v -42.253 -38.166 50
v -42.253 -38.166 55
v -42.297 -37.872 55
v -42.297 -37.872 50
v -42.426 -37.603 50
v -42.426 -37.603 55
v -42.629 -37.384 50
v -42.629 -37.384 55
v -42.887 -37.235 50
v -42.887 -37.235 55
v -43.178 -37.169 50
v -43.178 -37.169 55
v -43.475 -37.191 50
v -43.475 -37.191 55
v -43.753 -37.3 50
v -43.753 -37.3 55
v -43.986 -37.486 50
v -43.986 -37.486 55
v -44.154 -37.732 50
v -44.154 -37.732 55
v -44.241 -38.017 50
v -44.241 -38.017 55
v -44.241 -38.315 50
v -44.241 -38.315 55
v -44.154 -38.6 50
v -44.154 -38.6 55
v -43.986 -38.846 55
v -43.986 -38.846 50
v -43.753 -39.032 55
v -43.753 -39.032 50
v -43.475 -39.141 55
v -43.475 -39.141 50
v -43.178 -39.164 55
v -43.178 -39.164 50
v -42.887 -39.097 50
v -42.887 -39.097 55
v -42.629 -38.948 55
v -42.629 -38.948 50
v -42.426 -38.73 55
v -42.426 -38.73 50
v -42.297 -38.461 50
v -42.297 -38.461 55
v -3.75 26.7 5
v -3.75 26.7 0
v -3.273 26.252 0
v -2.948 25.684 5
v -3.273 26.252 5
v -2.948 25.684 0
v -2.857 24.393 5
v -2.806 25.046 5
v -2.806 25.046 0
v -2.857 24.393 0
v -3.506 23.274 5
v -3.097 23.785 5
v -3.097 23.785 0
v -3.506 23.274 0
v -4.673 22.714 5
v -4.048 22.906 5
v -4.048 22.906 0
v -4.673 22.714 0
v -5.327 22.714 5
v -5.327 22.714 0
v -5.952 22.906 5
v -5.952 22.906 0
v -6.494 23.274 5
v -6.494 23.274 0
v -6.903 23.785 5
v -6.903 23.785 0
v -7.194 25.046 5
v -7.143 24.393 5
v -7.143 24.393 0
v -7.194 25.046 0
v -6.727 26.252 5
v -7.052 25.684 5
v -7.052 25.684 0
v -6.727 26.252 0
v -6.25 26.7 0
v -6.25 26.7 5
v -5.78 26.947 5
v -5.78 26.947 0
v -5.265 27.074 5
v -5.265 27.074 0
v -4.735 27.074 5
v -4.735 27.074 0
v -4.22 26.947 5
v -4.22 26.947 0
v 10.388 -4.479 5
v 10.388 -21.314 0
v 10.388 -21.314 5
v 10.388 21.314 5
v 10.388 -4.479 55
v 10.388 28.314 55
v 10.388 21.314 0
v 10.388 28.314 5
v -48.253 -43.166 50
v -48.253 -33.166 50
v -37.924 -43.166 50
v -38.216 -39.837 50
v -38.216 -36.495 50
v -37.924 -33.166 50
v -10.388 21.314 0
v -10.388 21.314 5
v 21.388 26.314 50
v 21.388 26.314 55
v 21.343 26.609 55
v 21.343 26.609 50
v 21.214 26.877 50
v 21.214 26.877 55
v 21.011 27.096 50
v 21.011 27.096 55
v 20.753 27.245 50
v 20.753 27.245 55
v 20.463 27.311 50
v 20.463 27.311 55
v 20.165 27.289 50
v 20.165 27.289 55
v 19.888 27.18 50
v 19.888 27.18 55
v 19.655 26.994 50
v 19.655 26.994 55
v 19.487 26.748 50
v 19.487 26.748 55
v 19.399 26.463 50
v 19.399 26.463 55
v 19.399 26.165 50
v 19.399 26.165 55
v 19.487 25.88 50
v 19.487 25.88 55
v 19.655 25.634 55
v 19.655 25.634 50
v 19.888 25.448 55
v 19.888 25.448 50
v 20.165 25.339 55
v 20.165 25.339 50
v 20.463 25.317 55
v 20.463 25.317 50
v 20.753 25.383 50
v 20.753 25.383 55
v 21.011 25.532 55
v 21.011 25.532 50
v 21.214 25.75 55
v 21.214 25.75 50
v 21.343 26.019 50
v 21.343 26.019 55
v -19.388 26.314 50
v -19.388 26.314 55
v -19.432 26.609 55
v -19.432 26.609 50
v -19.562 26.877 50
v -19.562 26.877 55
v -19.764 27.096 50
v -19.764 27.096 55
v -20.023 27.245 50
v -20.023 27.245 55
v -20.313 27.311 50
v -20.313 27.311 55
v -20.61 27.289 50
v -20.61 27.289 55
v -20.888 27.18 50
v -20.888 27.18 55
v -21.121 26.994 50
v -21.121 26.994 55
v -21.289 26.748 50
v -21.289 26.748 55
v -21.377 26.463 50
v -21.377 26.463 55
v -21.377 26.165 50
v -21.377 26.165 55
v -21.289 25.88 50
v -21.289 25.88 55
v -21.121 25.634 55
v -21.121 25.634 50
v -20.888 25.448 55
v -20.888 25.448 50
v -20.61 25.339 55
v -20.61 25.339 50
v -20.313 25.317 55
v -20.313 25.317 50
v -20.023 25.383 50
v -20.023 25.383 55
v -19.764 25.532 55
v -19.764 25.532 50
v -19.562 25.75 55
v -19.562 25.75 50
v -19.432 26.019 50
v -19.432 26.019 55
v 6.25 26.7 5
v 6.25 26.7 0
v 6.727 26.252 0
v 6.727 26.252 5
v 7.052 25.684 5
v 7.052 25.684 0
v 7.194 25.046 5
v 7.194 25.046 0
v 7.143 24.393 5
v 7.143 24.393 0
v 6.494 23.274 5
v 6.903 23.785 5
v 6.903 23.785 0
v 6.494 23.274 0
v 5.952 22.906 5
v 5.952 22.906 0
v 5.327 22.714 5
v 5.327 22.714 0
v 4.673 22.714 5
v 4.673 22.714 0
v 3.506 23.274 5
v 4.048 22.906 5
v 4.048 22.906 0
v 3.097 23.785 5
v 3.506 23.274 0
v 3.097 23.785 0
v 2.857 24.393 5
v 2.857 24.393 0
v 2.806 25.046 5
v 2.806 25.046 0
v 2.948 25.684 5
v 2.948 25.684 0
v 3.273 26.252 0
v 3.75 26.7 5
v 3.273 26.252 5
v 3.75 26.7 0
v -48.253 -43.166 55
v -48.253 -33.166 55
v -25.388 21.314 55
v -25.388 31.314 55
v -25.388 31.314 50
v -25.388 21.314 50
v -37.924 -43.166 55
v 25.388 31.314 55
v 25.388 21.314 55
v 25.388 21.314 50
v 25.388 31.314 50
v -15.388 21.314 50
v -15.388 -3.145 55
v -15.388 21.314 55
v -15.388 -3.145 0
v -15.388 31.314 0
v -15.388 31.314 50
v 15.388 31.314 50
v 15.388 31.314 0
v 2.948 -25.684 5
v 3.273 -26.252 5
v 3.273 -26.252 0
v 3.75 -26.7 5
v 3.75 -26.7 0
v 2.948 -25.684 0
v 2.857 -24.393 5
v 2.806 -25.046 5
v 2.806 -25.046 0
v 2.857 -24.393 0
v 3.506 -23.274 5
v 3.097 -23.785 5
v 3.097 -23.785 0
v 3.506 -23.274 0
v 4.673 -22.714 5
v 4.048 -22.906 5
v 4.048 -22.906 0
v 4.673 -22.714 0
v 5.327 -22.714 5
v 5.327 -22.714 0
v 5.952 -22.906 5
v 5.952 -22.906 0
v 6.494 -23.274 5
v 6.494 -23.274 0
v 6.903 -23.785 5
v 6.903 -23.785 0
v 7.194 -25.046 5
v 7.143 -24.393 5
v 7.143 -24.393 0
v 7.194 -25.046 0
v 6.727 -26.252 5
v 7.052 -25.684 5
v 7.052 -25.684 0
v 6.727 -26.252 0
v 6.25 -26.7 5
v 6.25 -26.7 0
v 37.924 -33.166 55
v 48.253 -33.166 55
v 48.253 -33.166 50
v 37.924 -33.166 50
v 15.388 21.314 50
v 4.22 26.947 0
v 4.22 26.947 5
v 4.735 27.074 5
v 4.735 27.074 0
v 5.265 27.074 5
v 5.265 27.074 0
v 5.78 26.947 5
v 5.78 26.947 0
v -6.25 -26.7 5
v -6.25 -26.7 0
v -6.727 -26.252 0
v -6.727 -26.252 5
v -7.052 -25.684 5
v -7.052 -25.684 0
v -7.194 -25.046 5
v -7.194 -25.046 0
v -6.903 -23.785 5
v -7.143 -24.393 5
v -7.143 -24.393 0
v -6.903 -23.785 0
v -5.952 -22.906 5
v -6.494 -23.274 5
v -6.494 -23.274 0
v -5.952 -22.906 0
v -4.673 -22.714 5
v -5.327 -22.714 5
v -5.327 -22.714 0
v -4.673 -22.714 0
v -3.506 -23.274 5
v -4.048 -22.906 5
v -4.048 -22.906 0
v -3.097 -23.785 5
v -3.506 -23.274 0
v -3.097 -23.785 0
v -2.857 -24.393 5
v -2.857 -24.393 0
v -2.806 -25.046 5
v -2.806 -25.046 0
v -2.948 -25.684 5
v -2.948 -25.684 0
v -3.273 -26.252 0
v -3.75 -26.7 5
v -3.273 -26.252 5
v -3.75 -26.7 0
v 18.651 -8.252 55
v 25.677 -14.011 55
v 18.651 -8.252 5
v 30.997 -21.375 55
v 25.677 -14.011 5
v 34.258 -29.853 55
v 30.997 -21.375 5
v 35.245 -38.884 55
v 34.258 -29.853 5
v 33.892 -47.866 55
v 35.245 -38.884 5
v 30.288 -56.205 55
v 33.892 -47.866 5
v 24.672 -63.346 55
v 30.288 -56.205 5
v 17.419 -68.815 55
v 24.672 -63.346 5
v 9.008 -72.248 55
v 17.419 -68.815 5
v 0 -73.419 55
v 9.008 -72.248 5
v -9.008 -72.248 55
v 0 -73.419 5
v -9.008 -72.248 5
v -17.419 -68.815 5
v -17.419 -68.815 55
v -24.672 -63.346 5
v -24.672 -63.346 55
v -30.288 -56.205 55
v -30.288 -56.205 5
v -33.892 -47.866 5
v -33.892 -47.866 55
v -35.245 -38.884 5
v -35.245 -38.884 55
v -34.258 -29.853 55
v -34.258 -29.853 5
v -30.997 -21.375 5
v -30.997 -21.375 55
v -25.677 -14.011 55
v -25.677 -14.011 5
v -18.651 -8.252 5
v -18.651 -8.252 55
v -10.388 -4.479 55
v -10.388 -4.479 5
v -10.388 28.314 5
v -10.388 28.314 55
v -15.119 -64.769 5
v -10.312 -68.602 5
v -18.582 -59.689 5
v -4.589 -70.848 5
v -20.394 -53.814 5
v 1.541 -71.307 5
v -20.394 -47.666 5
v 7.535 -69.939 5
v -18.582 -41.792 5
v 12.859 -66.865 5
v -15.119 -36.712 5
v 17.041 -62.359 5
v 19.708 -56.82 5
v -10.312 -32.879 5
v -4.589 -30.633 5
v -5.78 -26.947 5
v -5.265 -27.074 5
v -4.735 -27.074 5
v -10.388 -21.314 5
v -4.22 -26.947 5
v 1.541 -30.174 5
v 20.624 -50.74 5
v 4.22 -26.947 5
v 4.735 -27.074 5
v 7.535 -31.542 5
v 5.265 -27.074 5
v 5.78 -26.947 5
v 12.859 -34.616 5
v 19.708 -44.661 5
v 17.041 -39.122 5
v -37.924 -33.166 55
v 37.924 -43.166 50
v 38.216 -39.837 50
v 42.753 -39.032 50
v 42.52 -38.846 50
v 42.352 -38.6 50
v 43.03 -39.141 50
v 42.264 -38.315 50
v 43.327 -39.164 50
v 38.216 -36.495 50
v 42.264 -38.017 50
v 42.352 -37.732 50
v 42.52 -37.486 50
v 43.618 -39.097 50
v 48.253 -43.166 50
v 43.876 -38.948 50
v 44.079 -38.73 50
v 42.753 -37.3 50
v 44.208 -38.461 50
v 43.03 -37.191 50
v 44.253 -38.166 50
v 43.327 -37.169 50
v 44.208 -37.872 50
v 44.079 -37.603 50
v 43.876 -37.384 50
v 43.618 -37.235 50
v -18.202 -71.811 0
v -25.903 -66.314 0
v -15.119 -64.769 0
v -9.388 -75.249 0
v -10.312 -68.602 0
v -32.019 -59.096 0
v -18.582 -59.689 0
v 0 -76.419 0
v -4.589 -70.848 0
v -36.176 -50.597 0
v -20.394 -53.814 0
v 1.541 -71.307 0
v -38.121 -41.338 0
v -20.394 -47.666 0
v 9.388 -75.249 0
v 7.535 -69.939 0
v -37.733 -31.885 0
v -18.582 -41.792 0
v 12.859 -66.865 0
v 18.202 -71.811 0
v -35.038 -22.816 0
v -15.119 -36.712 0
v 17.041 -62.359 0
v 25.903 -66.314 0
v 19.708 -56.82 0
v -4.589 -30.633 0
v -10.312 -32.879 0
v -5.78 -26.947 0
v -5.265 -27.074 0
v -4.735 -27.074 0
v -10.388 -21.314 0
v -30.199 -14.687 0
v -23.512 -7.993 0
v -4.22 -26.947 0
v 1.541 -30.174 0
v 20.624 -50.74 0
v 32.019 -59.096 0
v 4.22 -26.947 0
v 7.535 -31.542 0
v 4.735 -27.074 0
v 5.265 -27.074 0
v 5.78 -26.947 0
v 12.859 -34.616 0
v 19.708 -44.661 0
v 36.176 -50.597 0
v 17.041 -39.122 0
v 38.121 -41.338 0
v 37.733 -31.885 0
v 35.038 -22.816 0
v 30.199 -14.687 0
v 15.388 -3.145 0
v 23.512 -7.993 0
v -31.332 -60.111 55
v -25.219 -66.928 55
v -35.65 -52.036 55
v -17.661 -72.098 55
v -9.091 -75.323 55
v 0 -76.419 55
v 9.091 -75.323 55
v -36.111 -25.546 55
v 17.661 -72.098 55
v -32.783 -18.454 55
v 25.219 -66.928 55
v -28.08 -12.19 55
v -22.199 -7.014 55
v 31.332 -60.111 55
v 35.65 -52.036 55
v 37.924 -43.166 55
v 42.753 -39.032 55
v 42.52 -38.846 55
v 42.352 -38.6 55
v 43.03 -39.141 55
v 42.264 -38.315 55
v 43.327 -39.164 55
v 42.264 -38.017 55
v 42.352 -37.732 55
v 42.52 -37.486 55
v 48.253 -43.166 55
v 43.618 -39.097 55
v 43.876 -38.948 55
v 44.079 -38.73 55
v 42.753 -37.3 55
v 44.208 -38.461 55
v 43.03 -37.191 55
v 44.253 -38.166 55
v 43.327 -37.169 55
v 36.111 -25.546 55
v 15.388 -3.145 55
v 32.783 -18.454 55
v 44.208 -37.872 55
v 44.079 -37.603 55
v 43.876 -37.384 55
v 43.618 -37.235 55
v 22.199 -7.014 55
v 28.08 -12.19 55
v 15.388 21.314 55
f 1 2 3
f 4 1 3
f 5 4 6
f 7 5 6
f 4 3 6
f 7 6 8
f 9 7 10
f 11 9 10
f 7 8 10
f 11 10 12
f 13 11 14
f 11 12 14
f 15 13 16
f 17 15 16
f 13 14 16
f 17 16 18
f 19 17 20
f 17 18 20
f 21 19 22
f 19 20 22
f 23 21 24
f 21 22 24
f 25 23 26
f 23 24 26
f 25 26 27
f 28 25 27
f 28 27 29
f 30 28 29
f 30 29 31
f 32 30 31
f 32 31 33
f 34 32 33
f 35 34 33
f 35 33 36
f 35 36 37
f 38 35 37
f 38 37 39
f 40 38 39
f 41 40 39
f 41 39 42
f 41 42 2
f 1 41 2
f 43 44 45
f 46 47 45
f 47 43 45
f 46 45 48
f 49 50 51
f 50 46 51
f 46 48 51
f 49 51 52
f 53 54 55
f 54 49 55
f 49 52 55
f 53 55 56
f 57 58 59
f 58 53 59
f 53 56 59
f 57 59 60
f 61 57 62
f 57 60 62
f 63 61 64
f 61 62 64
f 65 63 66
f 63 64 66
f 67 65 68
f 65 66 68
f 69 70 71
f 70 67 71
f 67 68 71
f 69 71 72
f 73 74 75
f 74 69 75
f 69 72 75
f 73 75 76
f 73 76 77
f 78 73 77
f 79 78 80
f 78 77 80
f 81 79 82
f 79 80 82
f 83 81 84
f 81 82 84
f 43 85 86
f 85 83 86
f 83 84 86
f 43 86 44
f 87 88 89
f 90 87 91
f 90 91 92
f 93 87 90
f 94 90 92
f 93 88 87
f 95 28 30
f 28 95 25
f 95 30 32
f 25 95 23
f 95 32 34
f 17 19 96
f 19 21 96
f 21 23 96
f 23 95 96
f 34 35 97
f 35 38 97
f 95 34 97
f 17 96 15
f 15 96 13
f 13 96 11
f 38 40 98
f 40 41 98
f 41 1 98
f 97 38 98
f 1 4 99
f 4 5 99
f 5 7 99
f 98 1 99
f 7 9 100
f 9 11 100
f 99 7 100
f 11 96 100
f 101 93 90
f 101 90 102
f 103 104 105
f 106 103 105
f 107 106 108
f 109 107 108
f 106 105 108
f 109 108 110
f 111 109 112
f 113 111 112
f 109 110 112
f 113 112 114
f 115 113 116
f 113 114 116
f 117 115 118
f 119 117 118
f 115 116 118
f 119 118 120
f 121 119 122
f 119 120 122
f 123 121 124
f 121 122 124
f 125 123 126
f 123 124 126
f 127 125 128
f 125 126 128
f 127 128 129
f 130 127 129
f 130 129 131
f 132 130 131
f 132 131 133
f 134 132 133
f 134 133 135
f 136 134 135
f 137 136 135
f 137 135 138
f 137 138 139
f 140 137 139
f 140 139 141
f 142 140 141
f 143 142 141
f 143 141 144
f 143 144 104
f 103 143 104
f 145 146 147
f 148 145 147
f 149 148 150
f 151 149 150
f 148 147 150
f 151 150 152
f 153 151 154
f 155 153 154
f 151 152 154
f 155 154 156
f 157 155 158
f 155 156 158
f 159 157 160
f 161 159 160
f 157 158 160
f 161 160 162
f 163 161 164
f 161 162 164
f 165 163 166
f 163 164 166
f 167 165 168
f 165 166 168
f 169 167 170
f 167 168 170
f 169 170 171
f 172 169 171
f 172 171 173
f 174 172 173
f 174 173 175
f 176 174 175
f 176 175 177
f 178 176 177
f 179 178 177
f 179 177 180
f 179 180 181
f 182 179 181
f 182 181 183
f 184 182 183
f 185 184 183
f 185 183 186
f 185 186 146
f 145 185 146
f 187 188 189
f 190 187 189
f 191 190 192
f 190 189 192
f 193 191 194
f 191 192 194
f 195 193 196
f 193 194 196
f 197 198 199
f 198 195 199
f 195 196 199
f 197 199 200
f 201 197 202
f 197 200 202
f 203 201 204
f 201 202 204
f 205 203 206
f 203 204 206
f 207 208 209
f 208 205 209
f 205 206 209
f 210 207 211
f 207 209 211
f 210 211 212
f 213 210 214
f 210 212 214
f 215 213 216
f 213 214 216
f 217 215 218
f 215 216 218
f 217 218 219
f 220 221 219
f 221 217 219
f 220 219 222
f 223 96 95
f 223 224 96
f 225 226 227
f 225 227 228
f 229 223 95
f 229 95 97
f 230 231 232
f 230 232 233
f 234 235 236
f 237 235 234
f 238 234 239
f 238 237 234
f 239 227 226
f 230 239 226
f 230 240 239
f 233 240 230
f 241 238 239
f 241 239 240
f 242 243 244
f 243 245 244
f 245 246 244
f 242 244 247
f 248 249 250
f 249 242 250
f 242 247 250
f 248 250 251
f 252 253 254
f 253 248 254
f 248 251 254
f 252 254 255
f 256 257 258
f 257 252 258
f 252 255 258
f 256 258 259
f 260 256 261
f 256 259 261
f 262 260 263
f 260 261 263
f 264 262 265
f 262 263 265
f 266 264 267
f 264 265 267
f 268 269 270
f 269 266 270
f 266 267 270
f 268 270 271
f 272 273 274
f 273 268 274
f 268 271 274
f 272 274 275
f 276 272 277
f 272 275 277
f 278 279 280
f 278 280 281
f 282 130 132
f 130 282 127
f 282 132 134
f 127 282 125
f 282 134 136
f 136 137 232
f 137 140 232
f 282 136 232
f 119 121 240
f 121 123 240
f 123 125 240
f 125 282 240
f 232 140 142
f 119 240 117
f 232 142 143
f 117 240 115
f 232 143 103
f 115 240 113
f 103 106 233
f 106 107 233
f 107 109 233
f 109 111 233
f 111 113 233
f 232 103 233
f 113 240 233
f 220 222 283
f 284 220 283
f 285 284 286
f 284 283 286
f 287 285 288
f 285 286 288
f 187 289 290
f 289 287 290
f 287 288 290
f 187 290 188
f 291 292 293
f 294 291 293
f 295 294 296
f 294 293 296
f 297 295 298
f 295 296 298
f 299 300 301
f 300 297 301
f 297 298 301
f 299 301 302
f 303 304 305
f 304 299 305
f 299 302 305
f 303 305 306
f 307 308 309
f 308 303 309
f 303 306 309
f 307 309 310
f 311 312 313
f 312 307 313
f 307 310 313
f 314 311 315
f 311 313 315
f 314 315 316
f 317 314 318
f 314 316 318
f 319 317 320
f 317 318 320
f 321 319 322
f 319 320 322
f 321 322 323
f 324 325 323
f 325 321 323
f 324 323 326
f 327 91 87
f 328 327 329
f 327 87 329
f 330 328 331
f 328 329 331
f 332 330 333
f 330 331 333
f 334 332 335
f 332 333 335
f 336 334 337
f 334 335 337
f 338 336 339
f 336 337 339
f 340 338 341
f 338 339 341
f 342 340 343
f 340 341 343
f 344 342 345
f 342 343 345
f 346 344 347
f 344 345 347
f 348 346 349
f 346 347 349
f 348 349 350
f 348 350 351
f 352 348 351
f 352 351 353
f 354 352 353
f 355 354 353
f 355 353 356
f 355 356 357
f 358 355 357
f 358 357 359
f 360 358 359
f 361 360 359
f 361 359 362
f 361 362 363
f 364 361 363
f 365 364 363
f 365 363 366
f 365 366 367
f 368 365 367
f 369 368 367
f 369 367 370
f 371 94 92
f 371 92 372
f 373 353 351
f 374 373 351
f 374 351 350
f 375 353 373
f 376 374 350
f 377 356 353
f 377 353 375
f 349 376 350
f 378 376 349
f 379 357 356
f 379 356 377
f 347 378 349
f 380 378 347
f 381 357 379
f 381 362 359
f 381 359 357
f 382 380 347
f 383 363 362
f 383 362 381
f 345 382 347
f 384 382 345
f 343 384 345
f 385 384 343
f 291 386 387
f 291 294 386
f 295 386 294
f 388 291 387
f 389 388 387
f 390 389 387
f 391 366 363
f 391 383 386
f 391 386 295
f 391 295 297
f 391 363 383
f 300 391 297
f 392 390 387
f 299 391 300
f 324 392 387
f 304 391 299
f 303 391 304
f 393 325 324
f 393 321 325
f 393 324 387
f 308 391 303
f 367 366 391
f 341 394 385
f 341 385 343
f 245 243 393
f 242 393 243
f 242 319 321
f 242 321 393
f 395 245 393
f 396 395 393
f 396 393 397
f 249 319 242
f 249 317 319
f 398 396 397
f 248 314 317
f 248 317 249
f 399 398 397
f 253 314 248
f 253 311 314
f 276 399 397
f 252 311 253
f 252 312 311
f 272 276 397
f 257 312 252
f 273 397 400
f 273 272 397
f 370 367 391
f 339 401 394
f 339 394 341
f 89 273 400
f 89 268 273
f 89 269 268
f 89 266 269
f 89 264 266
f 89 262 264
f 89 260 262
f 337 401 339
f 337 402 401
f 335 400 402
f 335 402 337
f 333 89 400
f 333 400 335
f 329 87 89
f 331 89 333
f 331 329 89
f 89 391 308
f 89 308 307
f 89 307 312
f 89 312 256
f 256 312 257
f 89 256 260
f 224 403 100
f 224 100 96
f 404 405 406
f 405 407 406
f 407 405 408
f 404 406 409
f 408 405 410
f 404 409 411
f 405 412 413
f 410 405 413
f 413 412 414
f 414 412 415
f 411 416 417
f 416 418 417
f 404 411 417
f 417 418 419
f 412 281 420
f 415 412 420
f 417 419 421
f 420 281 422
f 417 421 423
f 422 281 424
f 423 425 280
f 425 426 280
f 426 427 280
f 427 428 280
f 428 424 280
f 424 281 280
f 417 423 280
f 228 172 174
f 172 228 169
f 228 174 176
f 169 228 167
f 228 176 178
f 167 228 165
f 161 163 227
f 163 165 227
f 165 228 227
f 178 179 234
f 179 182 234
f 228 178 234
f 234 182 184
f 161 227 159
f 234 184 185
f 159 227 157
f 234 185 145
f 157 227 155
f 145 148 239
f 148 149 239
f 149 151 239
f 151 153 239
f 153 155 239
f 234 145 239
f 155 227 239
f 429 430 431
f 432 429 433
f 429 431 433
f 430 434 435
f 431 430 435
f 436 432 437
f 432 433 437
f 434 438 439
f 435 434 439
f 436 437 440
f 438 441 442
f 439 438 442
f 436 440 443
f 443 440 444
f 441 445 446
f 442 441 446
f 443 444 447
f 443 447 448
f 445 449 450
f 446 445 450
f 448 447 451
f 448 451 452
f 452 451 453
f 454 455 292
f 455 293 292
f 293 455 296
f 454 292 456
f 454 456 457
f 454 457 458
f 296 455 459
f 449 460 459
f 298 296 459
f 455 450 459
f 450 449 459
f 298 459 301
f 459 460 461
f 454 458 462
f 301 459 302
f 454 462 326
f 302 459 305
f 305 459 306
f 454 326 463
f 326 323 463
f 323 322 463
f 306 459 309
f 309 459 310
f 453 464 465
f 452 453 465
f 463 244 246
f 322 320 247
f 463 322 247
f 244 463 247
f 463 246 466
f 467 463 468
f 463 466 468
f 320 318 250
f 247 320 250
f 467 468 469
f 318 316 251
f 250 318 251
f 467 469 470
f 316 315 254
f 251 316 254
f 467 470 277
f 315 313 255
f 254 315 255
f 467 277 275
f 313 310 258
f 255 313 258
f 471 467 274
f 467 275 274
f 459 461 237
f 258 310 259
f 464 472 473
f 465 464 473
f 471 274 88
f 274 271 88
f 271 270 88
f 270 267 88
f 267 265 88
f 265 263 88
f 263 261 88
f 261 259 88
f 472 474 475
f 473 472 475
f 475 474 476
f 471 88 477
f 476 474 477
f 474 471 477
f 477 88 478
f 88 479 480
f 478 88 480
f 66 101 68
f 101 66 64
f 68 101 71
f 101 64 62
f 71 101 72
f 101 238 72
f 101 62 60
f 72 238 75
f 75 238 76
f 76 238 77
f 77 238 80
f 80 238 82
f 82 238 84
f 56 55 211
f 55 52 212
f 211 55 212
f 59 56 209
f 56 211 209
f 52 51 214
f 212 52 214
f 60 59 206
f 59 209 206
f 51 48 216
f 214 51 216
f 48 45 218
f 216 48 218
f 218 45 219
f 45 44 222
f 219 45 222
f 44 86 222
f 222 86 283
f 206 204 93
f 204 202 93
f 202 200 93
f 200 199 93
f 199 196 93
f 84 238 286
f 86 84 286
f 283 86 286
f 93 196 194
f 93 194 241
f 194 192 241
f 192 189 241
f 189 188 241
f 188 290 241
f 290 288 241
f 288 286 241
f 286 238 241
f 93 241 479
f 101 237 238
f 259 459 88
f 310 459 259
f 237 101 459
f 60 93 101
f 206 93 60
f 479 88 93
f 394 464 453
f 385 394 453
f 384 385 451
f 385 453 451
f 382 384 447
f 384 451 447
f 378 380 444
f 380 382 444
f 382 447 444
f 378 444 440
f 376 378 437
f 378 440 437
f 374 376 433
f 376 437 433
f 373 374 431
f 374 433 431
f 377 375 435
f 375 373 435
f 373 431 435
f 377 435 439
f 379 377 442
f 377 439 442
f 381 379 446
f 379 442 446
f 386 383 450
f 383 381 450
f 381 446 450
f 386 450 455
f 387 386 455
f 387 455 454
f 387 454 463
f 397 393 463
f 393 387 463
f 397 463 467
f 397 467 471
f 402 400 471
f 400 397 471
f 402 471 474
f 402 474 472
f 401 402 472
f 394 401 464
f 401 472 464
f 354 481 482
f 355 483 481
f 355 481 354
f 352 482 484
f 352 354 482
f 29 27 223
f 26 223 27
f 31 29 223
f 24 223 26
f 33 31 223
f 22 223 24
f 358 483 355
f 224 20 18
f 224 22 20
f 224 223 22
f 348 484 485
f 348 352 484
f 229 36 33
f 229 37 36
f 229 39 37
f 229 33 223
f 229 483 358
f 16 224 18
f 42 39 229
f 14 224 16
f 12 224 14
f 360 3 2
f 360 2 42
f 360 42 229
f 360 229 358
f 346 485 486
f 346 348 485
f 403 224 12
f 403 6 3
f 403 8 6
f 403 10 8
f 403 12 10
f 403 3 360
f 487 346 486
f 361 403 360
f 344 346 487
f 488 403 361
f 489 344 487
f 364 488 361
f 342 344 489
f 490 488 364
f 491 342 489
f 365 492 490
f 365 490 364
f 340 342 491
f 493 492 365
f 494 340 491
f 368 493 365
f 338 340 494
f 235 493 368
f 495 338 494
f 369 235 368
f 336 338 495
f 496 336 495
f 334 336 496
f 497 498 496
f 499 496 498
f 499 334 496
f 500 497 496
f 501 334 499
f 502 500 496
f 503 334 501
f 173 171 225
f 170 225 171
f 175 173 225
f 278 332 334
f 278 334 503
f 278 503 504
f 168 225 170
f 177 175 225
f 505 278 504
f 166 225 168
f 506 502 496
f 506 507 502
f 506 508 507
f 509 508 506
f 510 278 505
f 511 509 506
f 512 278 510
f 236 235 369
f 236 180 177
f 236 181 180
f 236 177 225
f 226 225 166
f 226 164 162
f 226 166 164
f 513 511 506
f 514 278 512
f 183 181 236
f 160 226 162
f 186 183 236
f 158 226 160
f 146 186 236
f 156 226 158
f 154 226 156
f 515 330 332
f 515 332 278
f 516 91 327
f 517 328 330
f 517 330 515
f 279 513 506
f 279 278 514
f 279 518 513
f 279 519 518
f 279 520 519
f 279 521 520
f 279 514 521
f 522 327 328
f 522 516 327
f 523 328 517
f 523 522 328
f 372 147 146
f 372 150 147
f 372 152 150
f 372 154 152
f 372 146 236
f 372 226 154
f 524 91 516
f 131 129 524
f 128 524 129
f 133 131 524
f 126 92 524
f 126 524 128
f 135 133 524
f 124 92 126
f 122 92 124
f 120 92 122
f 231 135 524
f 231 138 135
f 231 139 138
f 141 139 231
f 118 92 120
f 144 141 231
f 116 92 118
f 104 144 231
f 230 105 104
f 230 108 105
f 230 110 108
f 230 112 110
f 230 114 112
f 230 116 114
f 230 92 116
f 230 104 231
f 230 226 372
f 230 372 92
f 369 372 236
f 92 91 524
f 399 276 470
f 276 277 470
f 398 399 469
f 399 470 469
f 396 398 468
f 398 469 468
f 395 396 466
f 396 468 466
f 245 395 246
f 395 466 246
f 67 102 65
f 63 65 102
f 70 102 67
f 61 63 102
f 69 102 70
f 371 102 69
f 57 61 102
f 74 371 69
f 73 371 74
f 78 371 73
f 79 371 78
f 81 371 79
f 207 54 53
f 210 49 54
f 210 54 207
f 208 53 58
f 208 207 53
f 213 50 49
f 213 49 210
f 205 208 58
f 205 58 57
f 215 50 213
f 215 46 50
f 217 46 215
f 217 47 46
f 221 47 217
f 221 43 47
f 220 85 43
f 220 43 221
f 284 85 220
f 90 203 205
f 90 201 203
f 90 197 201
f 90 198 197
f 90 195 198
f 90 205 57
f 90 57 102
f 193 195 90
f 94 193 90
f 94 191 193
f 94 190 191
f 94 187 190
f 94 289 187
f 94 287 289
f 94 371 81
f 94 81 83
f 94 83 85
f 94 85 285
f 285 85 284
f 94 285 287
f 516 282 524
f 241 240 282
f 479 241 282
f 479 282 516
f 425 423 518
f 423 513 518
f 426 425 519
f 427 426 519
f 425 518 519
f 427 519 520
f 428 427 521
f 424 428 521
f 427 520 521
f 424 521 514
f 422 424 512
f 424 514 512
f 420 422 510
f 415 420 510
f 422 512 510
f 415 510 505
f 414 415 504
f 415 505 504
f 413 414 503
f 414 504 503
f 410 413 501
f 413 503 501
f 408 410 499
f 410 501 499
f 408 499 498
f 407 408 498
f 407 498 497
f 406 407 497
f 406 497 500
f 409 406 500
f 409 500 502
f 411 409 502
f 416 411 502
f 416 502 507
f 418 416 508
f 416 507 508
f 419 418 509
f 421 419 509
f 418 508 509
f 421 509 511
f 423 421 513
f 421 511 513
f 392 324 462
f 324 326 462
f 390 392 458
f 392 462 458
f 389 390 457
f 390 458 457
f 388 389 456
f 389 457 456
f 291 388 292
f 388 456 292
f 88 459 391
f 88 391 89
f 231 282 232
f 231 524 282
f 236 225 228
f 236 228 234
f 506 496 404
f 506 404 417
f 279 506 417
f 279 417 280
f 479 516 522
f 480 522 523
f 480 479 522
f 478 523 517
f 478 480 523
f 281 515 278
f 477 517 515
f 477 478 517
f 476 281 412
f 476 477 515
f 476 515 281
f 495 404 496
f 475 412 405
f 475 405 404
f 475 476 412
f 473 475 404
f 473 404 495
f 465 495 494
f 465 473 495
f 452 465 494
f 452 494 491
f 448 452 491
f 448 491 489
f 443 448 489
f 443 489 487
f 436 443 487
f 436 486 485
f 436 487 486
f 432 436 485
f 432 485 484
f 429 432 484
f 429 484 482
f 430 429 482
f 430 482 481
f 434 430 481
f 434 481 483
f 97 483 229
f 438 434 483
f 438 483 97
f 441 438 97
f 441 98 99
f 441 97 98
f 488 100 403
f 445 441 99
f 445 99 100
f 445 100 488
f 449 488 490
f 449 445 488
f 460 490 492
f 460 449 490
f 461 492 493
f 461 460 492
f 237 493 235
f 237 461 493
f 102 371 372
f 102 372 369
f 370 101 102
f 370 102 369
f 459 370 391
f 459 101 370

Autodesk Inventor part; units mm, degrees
ref_plane "YZ Plane" through (0, 0, 0) normal (1, 0, 0) x (0, 1, 0)
ref_plane "XZ Plane" through (0, 0, 0) normal (0, 1, 0) x (-1, 0, 0)
ref_plane "XY Plane" through (0, 0, 0) normal (0, 0, 1) x (1, 0, 0)
ref_plane "Work Plane1" through (0, 0, 0) normal (0, 0, 1) x (1, 0, 0)
sketch "Sketch1" plane through (0, 0, 0) normal (0, 0, 1) x (1, 0, 0)
  line L0 (10.3879, -20.2759) -> (10.3879, 20.2759)
  line L1 (-9.35, -21.3138) -> (9.35, -21.3138)
  line L2 (-10.3879, -21.3138) -> (10.3879, -21.3138)
  line L3 (10.3879, -21.3138) -> (10.3879, 21.3138)
  line L4 (10.3879, 21.3138) -> (-10.3879, 21.3138)
  line L5 (-10.3879, 21.3138) -> (-10.3879, -21.3138)
  line L6 (-10.3879, -21.3138) -> (10.3879, 21.3138) construction
  line L7 (10.3879, -21.3138) -> (-10.3879, 21.3138) construction
  line L8 (-15.3879, 31.3138) -> (15.3879, 31.3138)
  arc A0 (-6.25, 26.7) -> (-3.75, 26.7) centre (-5, 24.8896) ccw projected
  arc A1 (3.75, 26.7) -> (6.25, 26.7) centre (5, 24.8896) ccw projected
  arc A2 (-3.75, -26.7) -> (-6.25, -26.7) centre (-5, -24.8896) ccw projected
  arc A3 (6.25, -26.7) -> (3.75, -26.7) centre (5, -24.8896) ccw projected
  circle A4 centre (-5, 24.8896) radius 2.2
  circle A5 centre (5, 24.8896) radius 2.2
  circle A6 centre (-5, -24.8896) radius 2.2
  circle A7 centre (5, -24.8896) radius 2.2
  circle A8 centre (0, -50.7404) radius 20.6245
  arc A9 (-15.3879, -3.1452) -> (15.3879, -3.1452) centre (0, -38.1663) ccw
  arc A10 (0.0421, 0.0864) -> (-0.0421, 0.0864) centre (0, -38.1663) ccw
  line L9 (15.3879, 31.3138) -> (15.3879, -3.1452)
  line L10 (-15.3879, -3.1452) -> (-15.3879, 31.3138)
  point P0 (0, 0)
  dimension "d0" = 10.3879
  dimension "d5" = 10
extrude "Extrusion1" add sketch "Sketch1" along normal blind 5
sketch "Sketch2" plane through (0, 0, 5) normal (0, 0, 1) x (1, 0, 0)
  arc A0 (-15.3879, -3.1452) -> (15.3879, -3.1452) centre (0, -38.1663) ccw projected
  arc A1 (-15.3879, -3.1452) -> (15.3879, -3.1452) centre (0, -38.1663) ccw
  circle A2 centre (-5, -24.8896) radius 2.2 projected
  circle A3 centre (5, -24.8896) radius 2.2 projected
  circle A4 centre (0, -50.7404) radius 20.6245 projected
  line L0 (-10.3879, -21.3138) -> (-10.3879, 21.3138) projected
  line L1 (10.3879, 21.3138) -> (10.3879, -21.3138) projected
  line L2 (10.3879, -21.3138) -> (-10.3879, -21.3138) projected
  line L3 (10.3879, -4.4789) -> (10.3879, -1.3511)
  line L4 (-10.3879, -1.3511) -> (-10.3879, -4.4789)
  line L5 (-15.3879, 31.3138) -> (15.3879, 31.3138)
  line L6 (15.3879, 31.3138) -> (15.3879, -3.1452)
  line L7 (-15.3879, -3.1452) -> (-15.3879, 31.3138)
  line L8 (10.3879, -4.4789) -> (10.3879, 21.3138)
  line L9 (-10.3879, 21.3138) -> (-10.3879, -4.4789)
  circle A5 centre (-5, 24.8896) radius 2.2 projected
  circle A6 centre (5, 24.8896) radius 2.2 projected
  circle A7 centre (0, -38.1663) radius 35.2526
  line L10 (10.3879, -4.4789) -> (10.3879, 28.3138)
  line L11 (10.3879, 28.3138) -> (-10.3879, 28.3138)
  line L12 (-10.3879, 28.3138) -> (-10.3879, -4.4789)
  point P0 (0, 0)
  dimension "d8" = 3
  dimension "d9" = 3
extrude "Extrusion2" add sketch "Sketch2" along normal blind 50 contours L7 L5 L6 A0
sketch "Sketch3" plane through (0, 0, 55) normal (0, 0, 1) x (1, 0, 0)
  line L0 (-15.3879, 31.3138) -> (-25.3879, 31.3138)
  line L1 (-25.3879, 31.3138) -> (-25.3879, 21.3138)
  line L2 (-25.3879, 21.3138) -> (-15.3879, 21.3138)
  line L3 (-15.3879, 31.3138) -> (-15.3879, -3.1452) projected
  line L4 (15.3879, 21.3138) -> (25.3879, 21.3138)
  line L5 (15.3879, -3.1452) -> (15.3879, 31.3138)
  line L6 (25.3879, 21.3138) -> (25.3879, 31.3138)
  line L7 (25.3879, 31.3138) -> (15.3879, 31.3138)
  arc A0 (-15.3879, -3.1452) -> (15.3879, -3.1452) centre (0, -38.1663) ccw projected
  line L8 (-25.3879, 31.3138) -> (-15.3879, 31.3138)
  line L9 (-15.3879, 31.3138) -> (-15.3879, 21.3138)
  line L10 (-15.3879, 21.3138) -> (-25.3879, 21.3138)
  line L11 (-25.3879, 21.3138) -> (-25.3879, 31.3138)
  line L12 (15.3879, 31.3138) -> (25.3879, 31.3138)
  line L13 (25.3879, 31.3138) -> (25.3879, 21.3138)
  line L14 (25.3879, 21.3138) -> (15.3879, 21.3138)
  line L15 (15.3879, 21.3138) -> (15.3879, 31.3138)
  circle A1 centre (-20.3879, 26.3138) radius 1
  circle A2 centre (20.3879, 26.3138) radius 1
  line L16 (-37.9245, -33.1663) -> (-48.2526, -33.1663)
  line L17 (-48.2526, -33.1663) -> (-48.2526, -43.1663)
  line L18 (-48.2526, -43.1663) -> (-37.9245, -43.1663)
  line L19 (-28.2526, -33.1663) -> (-48.2526, -43.1663) construction
  line L20 (-48.2526, -33.1663) -> (-28.2526, -43.1663) construction
  line L21 (-48.2526, -43.1663) -> (-38.2526, -43.1663)
  line L22 (-38.2526, -33.1663) -> (-48.2526, -33.1663)
  line L23 (-48.2526, -33.1663) -> (-48.2526, -43.1663)
  circle A3 centre (-43.2526, -38.1663) radius 1
  line L24 (48.2526, -33.1663) -> (37.9245, -33.1663)
  line L25 (37.9245, -43.1663) -> (48.2526, -43.1663)
  line L26 (48.2526, -43.1663) -> (48.2526, -33.1663)
  line L27 (48.2526, -33.1663) -> (28.2526, -43.1663) construction
  line L28 (28.2526, -33.1663) -> (48.2526, -43.1663) construction
  line L29 (48.2526, -43.1663) -> (38.2526, -43.1663)
  line L30 (38.2526, -33.1663) -> (48.2526, -33.1663)
  line L31 (48.2526, -33.1663) -> (48.2526, -43.1663)
  circle A4 centre (43.2526, -38.1663) radius 1
  circle A5 centre (0, -38.1663) radius 38.2526
  point P0 (0, 0)
  dimension "d14" = 20
  dimension "d15" = 10
  dimension "d16" = 2
  dimension "d18" = 10
  dimension "d19" = 2
extrude "Extrusion4" add sketch "Sketch3" against normal blind 5 contours L3 L2 L1 L0 | L5 L7 L6 L4 | A0 L18 L17 L16 | L24 L26 L25 A0
properties part number "Neck"
